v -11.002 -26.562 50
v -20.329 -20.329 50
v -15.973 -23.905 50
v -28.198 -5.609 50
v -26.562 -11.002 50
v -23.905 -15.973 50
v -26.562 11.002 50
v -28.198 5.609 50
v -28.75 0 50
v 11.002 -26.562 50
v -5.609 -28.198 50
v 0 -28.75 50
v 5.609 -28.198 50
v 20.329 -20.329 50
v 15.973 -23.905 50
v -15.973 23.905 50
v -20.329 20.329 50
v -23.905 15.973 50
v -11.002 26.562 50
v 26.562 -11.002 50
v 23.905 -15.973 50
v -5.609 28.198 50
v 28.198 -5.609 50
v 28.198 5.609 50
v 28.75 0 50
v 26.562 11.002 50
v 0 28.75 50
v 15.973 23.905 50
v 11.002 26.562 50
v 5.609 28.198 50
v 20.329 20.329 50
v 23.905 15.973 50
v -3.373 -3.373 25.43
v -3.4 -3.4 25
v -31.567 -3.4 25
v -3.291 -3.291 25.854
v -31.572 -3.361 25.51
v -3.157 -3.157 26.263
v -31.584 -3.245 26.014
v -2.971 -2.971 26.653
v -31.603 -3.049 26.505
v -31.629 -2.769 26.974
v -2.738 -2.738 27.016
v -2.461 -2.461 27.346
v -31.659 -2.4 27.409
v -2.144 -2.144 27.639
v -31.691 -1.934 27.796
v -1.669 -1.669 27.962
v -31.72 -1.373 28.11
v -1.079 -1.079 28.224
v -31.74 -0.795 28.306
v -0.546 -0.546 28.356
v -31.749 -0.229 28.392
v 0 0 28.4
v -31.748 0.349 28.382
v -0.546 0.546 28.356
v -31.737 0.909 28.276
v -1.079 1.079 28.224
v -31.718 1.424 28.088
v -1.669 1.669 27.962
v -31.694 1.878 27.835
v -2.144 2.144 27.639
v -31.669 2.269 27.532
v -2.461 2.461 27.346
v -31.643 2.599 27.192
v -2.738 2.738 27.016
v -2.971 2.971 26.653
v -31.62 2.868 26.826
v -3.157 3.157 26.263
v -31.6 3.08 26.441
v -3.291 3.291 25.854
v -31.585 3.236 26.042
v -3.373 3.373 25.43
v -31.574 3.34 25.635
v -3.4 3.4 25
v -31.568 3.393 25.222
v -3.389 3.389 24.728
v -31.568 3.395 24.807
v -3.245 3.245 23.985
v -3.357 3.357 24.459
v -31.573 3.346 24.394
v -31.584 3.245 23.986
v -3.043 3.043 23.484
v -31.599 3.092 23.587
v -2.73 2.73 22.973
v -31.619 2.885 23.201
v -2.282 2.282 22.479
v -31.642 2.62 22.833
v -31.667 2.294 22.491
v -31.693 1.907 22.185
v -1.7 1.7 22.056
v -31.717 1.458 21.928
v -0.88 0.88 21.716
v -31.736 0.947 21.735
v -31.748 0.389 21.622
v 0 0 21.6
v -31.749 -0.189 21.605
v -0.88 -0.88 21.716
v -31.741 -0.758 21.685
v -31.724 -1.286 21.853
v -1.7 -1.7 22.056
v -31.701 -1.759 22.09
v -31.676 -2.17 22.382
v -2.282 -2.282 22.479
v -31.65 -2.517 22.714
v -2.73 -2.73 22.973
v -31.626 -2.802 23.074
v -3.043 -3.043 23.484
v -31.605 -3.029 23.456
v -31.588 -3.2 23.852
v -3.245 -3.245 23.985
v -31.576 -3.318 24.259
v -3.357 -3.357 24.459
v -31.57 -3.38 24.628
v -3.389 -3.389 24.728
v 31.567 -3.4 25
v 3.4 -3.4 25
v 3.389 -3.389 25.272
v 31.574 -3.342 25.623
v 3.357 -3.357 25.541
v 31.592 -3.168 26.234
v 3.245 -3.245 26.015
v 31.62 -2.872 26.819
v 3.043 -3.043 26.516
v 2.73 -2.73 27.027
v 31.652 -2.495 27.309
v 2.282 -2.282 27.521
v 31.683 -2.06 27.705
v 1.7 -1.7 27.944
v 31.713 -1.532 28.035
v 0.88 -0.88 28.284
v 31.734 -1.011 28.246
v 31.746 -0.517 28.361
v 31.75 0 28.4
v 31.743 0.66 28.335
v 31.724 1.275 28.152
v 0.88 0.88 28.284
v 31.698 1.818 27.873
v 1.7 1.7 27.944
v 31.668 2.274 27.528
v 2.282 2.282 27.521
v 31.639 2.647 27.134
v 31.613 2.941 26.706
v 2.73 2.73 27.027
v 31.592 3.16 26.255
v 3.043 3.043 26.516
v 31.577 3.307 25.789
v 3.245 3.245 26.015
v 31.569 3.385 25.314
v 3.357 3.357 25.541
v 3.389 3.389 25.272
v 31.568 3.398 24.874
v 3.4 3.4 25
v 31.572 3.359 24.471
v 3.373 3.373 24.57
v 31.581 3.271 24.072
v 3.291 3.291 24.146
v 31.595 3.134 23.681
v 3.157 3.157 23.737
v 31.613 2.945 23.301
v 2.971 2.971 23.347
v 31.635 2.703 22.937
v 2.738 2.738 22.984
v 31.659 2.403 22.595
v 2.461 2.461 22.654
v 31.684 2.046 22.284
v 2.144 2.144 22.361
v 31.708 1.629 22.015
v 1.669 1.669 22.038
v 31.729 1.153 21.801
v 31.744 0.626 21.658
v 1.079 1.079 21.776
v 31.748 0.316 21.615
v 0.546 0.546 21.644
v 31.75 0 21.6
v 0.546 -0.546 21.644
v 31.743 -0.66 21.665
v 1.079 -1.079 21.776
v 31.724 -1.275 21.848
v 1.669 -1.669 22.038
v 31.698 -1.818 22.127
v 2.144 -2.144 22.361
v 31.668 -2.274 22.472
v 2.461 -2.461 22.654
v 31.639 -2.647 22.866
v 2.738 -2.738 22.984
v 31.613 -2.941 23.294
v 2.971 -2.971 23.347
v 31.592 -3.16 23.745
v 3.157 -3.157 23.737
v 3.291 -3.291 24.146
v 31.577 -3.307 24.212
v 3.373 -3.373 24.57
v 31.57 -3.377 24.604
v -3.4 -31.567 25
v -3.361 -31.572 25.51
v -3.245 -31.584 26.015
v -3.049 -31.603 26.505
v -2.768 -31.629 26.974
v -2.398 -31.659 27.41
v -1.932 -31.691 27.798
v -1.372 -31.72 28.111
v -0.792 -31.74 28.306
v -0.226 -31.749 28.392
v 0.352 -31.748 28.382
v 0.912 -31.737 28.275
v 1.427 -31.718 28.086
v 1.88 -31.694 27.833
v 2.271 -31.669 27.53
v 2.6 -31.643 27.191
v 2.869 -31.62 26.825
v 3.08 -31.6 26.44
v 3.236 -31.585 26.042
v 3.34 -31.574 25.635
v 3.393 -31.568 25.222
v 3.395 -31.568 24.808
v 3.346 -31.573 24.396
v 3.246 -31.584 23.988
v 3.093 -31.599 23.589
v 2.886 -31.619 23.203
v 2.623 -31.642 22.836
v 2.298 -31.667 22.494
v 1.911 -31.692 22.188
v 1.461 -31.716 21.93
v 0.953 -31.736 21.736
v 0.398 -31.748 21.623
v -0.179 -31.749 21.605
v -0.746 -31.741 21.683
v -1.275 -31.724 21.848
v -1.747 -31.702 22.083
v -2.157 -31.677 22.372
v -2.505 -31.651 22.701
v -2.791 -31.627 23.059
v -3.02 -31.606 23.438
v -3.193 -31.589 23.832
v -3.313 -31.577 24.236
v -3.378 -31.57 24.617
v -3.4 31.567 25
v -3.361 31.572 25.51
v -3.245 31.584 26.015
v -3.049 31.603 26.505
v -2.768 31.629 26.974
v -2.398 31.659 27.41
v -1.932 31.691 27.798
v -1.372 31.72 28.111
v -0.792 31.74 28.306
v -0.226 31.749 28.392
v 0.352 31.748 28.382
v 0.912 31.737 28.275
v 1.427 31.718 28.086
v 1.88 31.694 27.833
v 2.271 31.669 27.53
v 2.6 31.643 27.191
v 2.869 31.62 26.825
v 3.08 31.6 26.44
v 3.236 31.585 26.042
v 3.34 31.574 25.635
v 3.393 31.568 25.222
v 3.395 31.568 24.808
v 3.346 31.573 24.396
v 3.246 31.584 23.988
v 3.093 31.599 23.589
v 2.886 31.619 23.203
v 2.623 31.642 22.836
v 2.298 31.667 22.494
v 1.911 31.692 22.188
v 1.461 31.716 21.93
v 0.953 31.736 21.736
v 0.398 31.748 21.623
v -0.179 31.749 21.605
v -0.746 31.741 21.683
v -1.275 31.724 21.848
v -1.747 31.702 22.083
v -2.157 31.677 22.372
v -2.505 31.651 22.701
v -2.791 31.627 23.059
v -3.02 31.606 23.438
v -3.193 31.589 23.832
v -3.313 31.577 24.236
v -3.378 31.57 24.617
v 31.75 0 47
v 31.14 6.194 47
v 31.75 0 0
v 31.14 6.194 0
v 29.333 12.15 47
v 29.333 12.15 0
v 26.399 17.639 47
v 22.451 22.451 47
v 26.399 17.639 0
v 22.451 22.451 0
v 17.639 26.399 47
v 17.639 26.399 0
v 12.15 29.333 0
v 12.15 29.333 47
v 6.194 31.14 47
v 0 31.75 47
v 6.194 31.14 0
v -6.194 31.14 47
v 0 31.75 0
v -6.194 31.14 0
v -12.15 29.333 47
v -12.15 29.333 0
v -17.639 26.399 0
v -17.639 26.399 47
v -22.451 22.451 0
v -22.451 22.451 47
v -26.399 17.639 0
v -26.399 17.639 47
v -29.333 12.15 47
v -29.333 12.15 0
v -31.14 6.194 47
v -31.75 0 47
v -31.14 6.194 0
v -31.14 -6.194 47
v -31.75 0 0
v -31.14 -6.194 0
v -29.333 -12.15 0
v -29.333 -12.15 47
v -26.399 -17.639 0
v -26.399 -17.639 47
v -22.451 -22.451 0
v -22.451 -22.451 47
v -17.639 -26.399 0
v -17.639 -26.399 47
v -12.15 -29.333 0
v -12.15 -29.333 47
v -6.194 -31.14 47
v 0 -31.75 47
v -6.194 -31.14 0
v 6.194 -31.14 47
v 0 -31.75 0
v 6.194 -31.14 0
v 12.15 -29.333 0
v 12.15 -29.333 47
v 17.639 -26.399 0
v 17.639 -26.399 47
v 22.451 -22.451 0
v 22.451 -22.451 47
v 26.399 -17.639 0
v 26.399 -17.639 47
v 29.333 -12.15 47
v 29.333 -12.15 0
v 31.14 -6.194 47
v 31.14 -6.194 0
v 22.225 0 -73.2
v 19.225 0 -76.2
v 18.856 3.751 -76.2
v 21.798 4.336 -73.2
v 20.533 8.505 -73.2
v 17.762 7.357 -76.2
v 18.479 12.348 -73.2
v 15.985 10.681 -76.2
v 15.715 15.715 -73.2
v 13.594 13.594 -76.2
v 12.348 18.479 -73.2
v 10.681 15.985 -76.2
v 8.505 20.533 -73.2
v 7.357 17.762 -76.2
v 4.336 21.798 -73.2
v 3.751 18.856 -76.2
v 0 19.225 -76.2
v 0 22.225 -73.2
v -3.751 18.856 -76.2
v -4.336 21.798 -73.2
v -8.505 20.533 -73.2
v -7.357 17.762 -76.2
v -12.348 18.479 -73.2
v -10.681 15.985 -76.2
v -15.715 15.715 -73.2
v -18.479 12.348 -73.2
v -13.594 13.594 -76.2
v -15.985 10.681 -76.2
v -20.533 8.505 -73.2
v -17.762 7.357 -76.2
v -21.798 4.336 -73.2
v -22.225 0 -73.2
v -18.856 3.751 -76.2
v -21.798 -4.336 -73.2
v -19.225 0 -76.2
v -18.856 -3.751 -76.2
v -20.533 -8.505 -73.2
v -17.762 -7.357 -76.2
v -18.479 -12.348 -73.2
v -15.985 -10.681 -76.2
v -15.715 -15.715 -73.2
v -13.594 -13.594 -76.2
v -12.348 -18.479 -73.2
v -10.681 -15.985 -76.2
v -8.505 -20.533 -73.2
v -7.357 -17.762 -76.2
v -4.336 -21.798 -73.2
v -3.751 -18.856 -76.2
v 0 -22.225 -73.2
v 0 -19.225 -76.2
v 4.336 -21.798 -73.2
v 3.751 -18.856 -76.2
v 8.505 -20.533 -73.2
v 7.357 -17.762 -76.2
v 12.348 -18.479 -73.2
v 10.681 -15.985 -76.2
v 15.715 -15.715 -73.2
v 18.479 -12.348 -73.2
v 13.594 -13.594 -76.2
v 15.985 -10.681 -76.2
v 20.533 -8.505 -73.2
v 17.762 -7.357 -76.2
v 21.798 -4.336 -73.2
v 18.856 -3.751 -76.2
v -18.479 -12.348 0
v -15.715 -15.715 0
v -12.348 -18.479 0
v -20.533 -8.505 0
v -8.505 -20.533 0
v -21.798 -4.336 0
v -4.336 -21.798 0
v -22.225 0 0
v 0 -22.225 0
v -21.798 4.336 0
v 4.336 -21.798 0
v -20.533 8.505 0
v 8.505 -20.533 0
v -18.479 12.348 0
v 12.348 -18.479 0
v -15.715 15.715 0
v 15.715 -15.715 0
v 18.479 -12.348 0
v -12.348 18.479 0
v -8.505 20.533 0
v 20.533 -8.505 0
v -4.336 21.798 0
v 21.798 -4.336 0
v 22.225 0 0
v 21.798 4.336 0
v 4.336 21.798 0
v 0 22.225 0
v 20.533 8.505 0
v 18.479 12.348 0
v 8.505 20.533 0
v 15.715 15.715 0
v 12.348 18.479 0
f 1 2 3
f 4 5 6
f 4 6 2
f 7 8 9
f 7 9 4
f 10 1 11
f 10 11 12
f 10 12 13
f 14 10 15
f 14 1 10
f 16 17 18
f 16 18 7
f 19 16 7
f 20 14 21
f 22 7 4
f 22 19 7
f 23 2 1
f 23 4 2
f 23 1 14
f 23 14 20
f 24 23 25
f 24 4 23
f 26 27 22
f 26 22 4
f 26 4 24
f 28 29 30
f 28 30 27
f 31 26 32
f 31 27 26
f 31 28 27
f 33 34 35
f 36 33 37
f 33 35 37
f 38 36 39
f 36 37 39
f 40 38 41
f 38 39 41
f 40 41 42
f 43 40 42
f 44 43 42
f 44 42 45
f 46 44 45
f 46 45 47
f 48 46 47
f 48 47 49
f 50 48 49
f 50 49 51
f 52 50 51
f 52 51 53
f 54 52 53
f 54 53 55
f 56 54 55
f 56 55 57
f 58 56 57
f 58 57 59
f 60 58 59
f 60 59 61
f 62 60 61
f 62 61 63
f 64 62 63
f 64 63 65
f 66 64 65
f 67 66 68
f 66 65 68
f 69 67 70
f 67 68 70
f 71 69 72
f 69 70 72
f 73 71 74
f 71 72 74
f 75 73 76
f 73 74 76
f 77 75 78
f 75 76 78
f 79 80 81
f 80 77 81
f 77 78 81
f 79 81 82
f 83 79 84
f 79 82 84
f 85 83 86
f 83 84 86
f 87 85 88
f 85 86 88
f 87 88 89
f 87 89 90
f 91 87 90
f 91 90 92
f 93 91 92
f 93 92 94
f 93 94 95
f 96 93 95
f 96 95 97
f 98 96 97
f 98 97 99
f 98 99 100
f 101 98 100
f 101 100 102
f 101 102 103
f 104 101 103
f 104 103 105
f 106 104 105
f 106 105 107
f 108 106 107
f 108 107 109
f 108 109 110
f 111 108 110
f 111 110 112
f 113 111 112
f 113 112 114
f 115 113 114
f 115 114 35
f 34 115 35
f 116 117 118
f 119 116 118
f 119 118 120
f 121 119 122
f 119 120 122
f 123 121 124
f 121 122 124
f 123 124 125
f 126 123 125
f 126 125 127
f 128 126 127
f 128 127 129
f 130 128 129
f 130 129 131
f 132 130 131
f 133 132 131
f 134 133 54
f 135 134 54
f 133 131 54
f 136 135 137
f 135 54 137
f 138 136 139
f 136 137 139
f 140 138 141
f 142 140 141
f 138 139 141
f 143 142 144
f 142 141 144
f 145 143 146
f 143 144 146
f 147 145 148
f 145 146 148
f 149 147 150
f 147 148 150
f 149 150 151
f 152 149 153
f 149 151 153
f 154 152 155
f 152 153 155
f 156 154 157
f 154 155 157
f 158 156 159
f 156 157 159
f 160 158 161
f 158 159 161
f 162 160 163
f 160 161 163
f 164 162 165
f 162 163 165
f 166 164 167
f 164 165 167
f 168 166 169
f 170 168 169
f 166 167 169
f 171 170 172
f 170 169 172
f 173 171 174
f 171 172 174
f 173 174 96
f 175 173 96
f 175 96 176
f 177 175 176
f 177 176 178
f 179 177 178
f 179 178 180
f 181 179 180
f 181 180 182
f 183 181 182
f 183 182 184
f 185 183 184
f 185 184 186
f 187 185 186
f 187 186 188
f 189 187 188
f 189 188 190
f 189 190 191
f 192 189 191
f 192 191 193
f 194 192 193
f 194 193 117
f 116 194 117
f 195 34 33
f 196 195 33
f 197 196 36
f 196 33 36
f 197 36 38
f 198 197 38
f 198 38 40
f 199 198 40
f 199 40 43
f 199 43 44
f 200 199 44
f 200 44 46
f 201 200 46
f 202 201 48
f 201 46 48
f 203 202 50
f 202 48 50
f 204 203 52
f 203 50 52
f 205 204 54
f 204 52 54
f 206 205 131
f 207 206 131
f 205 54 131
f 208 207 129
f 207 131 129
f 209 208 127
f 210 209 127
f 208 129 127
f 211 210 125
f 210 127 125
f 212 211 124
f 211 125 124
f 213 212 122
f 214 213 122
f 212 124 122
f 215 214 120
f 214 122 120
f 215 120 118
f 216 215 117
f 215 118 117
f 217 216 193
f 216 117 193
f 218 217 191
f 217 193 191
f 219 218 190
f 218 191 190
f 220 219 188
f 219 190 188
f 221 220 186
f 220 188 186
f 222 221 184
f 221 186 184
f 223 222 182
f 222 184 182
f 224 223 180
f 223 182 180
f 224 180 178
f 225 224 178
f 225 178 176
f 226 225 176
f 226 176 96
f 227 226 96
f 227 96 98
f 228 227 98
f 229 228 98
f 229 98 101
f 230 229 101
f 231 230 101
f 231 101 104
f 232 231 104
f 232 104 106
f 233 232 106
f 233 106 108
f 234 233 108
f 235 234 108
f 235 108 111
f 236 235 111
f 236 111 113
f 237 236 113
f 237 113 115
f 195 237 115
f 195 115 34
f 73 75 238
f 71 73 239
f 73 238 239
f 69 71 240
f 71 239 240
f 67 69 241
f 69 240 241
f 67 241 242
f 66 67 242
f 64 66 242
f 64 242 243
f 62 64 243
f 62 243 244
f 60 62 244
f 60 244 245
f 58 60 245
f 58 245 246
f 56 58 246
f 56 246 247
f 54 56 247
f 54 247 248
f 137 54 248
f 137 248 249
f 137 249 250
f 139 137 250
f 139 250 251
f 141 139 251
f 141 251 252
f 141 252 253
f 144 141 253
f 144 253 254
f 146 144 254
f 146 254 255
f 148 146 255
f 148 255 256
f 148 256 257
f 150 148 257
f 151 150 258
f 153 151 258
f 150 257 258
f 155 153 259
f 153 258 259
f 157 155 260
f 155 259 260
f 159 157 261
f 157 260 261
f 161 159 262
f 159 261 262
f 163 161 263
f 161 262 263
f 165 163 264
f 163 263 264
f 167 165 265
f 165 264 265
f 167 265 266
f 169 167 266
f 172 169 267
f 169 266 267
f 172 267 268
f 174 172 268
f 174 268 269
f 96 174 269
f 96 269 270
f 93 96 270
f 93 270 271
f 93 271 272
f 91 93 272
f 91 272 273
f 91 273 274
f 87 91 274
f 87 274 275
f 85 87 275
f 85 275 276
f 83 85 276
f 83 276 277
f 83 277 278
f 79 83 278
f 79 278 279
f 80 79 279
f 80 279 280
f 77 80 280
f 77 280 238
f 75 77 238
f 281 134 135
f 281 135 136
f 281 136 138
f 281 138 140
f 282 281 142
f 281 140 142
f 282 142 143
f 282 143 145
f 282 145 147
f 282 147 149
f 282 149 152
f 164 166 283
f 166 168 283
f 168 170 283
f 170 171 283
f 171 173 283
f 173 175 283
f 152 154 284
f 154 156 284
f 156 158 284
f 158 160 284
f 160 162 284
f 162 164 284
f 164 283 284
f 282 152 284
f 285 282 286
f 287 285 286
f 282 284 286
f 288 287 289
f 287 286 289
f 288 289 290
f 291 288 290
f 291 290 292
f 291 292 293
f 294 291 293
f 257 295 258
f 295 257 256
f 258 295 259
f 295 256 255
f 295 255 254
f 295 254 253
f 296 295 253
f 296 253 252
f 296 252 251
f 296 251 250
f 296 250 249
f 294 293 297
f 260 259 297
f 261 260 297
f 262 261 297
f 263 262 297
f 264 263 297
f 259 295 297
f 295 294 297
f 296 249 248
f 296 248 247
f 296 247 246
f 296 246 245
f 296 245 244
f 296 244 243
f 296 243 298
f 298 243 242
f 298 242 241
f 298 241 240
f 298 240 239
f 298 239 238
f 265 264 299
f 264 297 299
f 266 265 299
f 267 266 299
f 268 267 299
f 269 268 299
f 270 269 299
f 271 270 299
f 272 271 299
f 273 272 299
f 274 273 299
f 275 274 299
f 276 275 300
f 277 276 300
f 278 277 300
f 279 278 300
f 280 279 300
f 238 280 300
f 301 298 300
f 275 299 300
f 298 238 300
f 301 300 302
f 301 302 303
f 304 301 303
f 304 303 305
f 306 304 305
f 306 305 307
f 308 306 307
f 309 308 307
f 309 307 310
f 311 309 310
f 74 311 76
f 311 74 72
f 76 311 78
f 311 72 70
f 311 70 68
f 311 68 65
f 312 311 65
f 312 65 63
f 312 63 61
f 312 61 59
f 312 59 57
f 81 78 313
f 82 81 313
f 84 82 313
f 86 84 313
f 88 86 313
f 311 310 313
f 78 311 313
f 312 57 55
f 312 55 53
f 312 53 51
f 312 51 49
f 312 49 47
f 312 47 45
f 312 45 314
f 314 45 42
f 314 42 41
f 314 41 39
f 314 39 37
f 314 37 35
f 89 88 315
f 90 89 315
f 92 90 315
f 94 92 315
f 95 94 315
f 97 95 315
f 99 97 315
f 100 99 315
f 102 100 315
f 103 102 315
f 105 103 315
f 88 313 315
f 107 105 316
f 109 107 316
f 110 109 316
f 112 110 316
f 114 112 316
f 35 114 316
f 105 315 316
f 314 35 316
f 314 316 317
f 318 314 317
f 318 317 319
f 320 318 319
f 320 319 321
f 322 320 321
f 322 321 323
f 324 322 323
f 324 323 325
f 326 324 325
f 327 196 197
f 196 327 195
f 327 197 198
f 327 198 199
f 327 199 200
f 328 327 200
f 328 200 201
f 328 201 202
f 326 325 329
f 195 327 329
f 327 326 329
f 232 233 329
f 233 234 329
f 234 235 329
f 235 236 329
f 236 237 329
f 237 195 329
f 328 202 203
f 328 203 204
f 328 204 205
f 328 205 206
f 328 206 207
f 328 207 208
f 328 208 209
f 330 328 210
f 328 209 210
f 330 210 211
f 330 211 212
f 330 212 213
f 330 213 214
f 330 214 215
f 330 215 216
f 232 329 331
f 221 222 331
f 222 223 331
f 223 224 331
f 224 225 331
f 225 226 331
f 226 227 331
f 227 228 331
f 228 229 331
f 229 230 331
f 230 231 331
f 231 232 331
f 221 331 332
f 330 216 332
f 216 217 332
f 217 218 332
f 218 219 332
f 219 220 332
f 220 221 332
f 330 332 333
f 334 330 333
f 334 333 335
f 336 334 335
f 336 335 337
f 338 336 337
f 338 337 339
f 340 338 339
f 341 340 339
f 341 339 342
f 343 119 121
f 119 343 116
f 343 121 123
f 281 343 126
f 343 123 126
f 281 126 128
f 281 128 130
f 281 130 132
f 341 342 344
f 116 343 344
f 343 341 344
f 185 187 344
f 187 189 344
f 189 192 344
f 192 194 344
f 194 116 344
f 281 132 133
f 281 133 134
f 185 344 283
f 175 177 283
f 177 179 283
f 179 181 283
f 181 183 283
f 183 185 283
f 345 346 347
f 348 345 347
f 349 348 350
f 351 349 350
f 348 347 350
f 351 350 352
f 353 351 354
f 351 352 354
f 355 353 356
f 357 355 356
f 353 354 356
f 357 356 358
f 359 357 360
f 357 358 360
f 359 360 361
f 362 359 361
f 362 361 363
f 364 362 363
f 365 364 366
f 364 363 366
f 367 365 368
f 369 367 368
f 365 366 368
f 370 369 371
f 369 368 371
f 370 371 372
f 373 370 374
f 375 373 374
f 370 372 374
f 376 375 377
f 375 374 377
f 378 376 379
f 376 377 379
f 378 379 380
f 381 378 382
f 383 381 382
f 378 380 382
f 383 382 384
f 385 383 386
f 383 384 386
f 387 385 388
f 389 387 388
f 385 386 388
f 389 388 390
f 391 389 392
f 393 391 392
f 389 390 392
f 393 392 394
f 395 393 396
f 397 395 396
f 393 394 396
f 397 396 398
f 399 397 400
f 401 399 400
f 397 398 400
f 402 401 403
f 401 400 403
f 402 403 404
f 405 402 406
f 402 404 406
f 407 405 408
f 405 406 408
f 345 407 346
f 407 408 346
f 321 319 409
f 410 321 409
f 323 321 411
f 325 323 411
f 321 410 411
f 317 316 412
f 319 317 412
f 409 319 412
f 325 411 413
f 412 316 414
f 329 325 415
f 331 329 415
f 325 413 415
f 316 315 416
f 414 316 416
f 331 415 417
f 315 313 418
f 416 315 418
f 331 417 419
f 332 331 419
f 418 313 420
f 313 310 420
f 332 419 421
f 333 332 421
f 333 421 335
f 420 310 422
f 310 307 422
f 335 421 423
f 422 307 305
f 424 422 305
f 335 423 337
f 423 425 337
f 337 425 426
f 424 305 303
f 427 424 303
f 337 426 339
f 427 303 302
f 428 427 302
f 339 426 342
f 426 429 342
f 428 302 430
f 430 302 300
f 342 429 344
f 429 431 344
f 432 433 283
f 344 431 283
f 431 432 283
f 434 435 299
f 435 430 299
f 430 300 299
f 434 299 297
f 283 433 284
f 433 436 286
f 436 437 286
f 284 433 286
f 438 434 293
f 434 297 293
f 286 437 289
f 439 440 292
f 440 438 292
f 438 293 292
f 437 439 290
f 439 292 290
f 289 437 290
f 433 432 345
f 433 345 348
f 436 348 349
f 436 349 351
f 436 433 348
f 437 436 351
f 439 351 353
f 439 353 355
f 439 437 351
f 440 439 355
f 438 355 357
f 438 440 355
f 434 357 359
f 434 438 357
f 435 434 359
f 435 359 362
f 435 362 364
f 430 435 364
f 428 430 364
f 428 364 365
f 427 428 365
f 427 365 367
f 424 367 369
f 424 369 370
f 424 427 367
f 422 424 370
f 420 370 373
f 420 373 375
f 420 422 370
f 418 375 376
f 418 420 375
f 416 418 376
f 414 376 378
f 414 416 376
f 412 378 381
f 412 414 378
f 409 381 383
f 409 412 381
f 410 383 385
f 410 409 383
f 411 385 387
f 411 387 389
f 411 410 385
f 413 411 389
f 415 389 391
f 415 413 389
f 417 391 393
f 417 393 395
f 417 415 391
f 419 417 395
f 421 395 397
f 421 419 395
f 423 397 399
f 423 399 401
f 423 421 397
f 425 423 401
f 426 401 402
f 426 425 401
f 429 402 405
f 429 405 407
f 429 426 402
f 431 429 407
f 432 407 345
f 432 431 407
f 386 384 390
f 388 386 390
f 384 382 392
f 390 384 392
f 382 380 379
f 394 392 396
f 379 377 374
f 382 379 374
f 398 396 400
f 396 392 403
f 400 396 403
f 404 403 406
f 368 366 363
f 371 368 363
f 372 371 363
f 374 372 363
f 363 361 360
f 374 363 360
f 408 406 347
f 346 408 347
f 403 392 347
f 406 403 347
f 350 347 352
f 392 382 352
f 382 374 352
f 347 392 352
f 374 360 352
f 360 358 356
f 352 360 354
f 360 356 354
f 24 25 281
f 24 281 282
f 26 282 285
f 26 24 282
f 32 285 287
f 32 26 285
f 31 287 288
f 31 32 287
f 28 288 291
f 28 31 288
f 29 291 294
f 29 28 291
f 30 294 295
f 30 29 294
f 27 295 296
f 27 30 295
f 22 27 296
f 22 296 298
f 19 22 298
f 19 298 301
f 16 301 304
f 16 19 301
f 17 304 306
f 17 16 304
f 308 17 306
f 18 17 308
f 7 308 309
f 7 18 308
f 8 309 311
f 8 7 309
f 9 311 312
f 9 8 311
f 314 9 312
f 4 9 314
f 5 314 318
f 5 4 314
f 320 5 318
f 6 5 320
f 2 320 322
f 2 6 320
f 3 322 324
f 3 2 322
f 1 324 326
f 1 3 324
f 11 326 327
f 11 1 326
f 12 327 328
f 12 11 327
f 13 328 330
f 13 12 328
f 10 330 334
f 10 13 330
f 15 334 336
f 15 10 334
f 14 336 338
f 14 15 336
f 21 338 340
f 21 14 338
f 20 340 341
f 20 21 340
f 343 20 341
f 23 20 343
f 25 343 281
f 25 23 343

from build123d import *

# Parameters (mm, degrees)
F0_R       = 22.225
F1_DEPTH   = 76.2
F0_R_2     = 31.75
F2_DEPTH   = 50
F3_SIZE    = 3
F9_D       = 6.8
F9_ON_F7_D = 6.8


with BuildPart() as f1:
    # F0 (on Top) → F1 (new body)
    with BuildSketch(Plane.XY):
        Circle(F0_R)
    extrude(amount=-F1_DEPTH)

    # F0 (on Top) → F2 (join)
    with BuildSketch(Plane.XY):
        Circle(F0_R_2)
        Circle(F0_R, mode=Mode.SUBTRACT)
        Circle(F0_R)
    extrude(amount=F2_DEPTH)

    # F3
    f3_edges = [f1.edges().sort_by_distance(p)[0] for p in [
        (-31.75, 0, 50),
        (-22.225, 0, -76.2),
    ]]
    chamfer(f3_edges, length=F3_SIZE)

    # F9 (through all)
    with Locations(Plane.XZ.offset(31.75)):
        with Locations((0, 25)):
            Hole(F9_D / 2)

    # F9 on F7 (through all)
    with Locations(Plane.YZ.offset(31.75)):
        with Locations((0, 25)):
            Hole(F9_ON_F7_D / 2)


solid = f1.part
